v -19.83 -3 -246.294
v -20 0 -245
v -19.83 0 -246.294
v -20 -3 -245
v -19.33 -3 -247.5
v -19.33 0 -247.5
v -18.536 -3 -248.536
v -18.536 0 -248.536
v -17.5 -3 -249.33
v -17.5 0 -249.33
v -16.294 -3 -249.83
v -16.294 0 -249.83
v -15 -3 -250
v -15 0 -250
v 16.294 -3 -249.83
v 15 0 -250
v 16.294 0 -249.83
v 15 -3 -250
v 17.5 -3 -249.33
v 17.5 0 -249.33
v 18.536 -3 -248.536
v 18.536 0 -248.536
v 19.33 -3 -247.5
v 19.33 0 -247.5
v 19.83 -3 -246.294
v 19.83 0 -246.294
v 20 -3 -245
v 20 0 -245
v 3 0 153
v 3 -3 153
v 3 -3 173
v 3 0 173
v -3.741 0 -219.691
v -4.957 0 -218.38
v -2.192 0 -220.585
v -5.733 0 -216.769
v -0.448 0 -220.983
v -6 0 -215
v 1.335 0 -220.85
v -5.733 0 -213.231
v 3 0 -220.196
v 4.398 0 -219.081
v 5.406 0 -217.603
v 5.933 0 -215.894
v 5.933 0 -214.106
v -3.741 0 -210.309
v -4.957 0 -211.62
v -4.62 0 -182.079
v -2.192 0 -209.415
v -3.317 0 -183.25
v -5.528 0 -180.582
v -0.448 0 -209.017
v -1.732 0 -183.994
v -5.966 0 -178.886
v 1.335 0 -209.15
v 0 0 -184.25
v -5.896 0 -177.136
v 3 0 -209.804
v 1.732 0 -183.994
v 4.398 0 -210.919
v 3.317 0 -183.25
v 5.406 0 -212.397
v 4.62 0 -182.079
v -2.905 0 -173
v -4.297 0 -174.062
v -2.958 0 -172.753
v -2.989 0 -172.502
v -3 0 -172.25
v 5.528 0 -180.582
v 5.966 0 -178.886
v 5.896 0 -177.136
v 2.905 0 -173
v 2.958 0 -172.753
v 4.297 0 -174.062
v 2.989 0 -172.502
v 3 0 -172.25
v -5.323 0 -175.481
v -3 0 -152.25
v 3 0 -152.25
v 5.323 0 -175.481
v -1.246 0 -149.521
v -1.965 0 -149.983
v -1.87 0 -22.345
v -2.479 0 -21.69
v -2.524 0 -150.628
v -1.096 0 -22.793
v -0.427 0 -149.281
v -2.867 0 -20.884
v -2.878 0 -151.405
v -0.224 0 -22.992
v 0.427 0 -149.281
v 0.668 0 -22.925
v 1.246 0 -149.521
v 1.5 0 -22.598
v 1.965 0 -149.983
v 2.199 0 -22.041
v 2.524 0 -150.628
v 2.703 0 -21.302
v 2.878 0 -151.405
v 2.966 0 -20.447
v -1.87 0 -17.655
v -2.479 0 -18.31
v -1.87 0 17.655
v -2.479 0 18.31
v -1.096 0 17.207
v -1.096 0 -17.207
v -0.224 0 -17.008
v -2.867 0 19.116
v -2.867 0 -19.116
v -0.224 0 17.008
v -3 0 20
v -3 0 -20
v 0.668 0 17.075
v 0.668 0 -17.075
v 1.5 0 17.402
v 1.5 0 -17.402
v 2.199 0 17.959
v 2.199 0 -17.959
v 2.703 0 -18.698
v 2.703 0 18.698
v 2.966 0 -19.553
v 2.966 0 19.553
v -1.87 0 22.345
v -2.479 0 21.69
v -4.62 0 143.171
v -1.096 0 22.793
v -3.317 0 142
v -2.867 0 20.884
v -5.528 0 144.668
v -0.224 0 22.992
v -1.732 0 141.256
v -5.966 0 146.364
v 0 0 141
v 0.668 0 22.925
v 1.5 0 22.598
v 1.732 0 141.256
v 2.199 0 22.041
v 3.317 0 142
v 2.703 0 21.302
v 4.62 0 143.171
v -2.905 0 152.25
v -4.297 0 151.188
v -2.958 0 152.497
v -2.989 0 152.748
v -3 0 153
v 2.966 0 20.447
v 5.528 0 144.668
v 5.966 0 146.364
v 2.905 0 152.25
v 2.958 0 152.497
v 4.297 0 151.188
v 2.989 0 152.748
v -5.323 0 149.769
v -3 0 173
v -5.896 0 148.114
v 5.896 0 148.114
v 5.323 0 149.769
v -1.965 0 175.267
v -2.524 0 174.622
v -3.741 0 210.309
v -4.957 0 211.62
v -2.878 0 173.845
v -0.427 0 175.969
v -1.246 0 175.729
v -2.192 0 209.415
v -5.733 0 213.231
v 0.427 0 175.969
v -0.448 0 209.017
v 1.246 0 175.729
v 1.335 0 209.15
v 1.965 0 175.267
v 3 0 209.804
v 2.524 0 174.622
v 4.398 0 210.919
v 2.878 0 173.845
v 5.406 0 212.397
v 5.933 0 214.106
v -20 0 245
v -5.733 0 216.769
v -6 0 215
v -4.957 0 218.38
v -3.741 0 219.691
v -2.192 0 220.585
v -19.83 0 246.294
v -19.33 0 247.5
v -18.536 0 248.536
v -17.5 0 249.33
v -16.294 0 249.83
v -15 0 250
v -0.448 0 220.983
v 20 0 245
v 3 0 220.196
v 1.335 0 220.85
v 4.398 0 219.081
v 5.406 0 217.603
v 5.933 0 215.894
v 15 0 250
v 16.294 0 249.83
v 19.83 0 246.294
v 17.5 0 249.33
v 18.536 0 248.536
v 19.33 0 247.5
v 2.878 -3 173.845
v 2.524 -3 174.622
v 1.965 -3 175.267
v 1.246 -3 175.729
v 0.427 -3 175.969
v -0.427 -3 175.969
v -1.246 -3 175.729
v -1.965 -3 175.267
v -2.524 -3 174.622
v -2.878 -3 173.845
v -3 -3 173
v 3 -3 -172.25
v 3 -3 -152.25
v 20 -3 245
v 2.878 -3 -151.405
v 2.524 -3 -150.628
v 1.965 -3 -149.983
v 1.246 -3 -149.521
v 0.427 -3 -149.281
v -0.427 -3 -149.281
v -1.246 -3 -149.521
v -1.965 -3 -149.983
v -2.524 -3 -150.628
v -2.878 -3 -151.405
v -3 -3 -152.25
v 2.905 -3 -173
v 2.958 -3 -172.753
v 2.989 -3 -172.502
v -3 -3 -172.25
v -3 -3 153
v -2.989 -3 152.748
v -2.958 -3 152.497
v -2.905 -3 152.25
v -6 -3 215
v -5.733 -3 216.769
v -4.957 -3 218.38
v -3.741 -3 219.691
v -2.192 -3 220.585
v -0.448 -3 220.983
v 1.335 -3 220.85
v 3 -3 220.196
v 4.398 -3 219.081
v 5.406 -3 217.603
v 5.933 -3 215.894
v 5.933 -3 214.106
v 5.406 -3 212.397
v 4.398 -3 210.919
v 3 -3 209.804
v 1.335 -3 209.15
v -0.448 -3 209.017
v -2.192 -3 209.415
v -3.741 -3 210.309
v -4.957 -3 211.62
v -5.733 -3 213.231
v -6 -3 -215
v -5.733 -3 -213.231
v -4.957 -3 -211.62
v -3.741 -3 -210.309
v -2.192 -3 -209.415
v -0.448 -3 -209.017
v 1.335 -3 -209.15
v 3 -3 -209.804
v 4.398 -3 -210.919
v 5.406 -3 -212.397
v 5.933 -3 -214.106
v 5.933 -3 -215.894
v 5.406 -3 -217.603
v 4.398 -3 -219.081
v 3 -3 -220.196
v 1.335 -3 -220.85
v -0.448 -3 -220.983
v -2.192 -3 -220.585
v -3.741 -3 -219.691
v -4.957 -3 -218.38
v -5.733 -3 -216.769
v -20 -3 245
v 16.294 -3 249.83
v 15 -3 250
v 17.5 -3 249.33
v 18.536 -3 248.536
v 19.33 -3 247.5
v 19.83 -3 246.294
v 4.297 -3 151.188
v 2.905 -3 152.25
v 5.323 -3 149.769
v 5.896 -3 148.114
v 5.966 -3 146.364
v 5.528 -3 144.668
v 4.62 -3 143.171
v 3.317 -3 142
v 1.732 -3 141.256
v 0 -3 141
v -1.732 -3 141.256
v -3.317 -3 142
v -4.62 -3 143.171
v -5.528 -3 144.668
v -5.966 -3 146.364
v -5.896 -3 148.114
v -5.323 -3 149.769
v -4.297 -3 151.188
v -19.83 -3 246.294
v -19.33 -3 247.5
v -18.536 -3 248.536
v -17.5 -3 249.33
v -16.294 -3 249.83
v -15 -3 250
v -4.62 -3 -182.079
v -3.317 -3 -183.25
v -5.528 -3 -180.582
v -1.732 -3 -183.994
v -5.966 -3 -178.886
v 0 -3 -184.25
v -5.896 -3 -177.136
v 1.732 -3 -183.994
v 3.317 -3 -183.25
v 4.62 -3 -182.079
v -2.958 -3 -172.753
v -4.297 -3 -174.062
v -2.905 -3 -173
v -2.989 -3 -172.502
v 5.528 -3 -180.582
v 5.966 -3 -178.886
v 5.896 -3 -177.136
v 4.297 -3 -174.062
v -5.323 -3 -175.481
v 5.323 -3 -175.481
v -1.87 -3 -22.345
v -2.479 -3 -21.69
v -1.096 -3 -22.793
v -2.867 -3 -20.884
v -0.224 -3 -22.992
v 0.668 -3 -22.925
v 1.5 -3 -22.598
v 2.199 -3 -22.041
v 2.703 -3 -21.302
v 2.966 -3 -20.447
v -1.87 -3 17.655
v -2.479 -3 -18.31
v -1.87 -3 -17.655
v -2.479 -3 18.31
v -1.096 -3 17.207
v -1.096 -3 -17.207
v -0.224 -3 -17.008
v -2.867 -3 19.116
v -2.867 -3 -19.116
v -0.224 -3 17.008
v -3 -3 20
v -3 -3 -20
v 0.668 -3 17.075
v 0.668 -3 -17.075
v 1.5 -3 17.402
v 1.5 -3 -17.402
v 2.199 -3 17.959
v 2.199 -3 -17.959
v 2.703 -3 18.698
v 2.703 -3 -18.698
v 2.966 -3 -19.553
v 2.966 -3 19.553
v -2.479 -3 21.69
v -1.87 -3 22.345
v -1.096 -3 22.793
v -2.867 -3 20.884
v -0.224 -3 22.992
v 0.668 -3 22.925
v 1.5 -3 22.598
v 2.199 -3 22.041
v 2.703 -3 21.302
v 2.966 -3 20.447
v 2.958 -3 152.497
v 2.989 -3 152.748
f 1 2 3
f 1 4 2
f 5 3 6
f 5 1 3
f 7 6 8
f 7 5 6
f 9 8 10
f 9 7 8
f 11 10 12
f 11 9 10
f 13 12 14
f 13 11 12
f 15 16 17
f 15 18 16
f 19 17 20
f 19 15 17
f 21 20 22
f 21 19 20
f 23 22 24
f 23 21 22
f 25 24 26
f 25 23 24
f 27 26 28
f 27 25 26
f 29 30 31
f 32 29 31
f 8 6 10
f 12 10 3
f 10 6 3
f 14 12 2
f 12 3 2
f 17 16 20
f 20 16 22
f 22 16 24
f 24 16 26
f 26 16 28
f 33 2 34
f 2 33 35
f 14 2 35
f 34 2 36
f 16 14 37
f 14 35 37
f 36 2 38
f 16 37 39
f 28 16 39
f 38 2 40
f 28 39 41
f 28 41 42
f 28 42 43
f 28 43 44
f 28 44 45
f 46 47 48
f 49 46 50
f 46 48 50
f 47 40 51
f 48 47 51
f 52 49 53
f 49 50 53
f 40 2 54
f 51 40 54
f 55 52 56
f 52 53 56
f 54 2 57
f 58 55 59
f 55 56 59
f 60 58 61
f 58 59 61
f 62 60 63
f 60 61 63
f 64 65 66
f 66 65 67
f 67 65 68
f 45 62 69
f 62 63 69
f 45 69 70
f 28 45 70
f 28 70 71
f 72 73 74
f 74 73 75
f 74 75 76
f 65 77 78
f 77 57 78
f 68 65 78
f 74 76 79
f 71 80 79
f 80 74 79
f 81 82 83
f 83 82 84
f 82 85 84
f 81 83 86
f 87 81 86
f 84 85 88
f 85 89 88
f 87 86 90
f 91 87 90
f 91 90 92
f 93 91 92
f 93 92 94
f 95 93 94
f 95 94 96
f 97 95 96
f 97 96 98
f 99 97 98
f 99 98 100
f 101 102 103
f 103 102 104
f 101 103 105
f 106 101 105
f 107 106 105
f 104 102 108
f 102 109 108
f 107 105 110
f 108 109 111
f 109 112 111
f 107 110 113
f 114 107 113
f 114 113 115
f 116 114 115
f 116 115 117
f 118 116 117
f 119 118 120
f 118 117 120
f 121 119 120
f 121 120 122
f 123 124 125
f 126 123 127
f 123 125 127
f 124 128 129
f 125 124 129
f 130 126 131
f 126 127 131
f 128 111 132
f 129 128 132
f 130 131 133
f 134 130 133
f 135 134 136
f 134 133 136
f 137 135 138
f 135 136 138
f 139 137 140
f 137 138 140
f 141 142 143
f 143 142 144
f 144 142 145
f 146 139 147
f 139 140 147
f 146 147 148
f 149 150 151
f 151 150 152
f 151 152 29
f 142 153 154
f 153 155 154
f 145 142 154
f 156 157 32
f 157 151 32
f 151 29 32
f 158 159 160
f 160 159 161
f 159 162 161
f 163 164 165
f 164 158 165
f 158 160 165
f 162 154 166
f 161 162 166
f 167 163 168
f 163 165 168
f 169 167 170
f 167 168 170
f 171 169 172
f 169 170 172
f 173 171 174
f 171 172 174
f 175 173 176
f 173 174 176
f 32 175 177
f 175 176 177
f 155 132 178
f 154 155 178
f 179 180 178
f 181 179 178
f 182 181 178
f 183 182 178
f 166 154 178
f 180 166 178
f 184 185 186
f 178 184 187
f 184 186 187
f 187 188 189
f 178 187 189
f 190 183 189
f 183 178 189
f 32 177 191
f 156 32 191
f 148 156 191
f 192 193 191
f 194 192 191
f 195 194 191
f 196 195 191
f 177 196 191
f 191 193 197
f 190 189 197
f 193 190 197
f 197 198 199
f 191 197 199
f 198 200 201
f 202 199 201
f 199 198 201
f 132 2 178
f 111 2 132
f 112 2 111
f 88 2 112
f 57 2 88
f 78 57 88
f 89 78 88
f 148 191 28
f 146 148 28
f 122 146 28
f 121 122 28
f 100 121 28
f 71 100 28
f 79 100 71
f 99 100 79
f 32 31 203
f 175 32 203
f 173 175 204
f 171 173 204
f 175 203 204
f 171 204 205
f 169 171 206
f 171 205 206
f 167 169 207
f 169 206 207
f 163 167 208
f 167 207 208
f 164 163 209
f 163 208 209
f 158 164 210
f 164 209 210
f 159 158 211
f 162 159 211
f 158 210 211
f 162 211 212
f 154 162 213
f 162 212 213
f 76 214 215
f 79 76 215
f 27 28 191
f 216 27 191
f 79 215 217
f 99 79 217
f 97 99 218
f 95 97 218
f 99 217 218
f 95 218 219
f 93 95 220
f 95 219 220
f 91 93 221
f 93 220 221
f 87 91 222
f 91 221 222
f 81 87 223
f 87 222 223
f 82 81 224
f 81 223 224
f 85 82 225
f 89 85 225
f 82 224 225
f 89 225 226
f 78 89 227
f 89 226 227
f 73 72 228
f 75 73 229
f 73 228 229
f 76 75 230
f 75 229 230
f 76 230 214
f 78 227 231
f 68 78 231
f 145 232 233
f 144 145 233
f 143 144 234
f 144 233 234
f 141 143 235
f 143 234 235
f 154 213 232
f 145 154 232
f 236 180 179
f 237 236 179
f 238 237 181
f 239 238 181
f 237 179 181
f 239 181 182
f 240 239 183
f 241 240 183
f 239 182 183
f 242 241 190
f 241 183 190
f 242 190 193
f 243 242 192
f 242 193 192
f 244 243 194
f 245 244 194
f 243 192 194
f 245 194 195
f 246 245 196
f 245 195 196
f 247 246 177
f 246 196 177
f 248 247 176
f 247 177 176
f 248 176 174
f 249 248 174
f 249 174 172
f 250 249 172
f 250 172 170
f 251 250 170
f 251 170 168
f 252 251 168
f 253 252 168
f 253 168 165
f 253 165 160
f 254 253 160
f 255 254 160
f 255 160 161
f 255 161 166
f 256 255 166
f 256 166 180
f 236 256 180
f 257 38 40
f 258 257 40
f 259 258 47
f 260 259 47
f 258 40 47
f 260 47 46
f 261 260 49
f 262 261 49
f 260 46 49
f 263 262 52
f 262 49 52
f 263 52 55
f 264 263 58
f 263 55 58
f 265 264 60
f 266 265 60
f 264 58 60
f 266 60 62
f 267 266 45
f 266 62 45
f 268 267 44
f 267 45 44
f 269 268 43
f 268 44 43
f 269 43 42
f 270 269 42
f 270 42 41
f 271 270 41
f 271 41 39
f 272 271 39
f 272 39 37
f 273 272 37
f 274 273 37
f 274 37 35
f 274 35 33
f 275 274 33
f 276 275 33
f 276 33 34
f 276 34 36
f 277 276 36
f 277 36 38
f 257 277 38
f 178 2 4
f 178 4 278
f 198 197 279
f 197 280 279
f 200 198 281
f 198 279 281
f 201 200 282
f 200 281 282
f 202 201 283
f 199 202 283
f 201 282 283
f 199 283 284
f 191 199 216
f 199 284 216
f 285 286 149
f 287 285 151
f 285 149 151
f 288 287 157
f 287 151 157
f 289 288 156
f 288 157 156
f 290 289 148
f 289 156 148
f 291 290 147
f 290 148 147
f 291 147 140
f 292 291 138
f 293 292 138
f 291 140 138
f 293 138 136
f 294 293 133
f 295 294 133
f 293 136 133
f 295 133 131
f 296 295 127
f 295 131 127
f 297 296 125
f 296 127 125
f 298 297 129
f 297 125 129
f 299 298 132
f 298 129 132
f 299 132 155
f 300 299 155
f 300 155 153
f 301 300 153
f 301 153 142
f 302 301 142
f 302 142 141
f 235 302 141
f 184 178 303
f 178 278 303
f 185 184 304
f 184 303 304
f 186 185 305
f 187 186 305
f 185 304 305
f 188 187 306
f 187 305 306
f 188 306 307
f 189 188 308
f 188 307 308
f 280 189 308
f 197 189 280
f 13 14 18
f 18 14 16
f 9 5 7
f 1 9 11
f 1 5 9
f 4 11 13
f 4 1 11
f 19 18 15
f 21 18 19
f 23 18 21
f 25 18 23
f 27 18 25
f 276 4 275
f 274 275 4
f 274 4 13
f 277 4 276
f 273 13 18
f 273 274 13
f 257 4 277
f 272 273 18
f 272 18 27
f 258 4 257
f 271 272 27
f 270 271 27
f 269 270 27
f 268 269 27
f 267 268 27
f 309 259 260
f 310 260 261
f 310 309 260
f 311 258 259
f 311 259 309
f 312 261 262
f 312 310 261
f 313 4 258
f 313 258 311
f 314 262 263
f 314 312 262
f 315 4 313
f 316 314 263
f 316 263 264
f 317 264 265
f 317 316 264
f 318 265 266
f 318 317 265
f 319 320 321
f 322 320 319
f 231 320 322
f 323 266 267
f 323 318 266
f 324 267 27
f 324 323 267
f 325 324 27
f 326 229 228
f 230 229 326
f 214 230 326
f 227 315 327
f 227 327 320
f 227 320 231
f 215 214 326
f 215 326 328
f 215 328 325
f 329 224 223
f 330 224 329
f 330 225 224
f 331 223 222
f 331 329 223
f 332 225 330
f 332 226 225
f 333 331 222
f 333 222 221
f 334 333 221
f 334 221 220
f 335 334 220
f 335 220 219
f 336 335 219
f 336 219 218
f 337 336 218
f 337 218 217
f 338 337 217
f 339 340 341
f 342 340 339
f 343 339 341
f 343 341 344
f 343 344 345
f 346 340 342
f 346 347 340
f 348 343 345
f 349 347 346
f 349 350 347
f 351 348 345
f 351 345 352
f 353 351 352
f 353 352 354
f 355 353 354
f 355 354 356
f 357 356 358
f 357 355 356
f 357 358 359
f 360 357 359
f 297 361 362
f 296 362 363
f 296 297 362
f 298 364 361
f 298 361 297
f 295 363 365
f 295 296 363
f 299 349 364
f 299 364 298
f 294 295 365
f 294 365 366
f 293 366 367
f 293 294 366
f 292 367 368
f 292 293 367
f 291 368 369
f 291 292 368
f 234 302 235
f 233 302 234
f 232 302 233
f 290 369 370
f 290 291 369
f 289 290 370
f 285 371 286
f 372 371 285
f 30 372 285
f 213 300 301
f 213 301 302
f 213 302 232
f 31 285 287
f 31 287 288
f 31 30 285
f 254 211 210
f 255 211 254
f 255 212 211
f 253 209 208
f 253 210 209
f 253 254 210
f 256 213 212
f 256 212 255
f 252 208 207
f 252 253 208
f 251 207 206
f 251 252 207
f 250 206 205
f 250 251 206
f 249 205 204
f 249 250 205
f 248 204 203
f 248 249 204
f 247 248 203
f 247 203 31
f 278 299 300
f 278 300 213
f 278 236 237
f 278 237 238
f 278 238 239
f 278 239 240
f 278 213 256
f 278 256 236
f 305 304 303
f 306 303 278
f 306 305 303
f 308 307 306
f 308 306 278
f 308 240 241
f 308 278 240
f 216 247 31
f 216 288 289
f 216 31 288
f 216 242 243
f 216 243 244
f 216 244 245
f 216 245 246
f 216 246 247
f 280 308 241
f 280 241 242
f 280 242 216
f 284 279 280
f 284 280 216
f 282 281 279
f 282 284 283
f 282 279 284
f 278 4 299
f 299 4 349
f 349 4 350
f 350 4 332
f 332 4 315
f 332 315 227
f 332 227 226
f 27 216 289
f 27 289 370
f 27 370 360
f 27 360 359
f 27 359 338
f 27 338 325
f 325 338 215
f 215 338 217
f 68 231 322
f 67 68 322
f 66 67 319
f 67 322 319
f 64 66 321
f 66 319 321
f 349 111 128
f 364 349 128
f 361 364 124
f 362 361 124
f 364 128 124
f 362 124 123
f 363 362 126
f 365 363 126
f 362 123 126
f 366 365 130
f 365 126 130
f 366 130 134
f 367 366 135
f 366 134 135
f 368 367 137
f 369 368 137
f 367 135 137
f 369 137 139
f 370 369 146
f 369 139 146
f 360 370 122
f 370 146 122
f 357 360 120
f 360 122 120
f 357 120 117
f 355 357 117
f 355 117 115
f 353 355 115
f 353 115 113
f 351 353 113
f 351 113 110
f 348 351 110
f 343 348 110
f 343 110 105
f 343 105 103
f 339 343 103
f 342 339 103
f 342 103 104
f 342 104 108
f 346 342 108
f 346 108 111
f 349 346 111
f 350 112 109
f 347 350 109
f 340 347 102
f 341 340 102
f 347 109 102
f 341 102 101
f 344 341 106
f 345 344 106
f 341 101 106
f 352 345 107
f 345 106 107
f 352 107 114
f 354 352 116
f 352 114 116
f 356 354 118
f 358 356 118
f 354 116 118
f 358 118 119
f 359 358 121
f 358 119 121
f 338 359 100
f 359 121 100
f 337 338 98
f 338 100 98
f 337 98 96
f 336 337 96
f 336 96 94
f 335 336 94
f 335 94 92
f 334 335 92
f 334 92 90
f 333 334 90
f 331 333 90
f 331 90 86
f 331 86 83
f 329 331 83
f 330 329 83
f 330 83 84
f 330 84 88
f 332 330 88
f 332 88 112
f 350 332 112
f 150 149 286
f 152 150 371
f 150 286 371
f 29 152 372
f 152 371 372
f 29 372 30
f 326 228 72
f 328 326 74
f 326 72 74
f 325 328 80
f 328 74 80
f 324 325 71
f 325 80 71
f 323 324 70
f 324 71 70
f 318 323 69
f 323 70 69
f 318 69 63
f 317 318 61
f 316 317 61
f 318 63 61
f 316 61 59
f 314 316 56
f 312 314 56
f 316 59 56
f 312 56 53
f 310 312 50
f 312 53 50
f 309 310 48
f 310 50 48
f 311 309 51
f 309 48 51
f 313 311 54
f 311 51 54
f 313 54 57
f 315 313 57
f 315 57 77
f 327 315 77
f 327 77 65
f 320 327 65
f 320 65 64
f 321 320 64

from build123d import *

# Parameters (mm, degrees)
F0_W      = 40
F0_H      = 500
F1_DEPTH  = 3
F3_D      = 12
F5_D      = 12
F7_DEPTH  = 6
F8_D      = 12
F10_DEPTH = 6
F12_D     = 6
F13_R     = 5


with BuildPart() as f1:
    # F0 (on Front) → F1 (new body)
    with BuildSketch(Plane.XZ):
        Rectangle(F0_W, F0_H)
    extrude(amount=F1_DEPTH)

    # F3 (through all)
    with Locations(Plane.XZ.offset(3)):
        with Locations((0, -215), (0, 215)):
            Hole(F3_D / 2)

    # F5 (through all)
    with Locations(Plane.XZ.offset(3)):
        with Locations((0, 147)):
            Hole(F5_D / 2)

    # F6 (on face) → F7 (cut)
    with BuildSketch(Plane.XZ.offset(3)):
        with BuildLine():
            ThreePointArc((-3, 153), (0, 150), (3, 153))
            Line((3, 153), (3, 173))
            ThreePointArc((3, 173), (0, 176), (-3, 173))
            Line((-3, 173), (-3, 153))
        make_face()
    extrude(amount=-F7_DEPTH, mode=Mode.SUBTRACT)

    # F8 (through all)
    with Locations(Plane.XZ.offset(3)):
        with Locations((0, -178.25)):
            Hole(F8_D / 2)

    # F9 (on face) → F10 (cut)
    with BuildSketch(Plane.XZ.offset(3)):
        with BuildLine():
            ThreePointArc((-3, -172.25), (0, -175.25), (3, -172.25))
            Line((3, -172.25), (3, -152.25))
            ThreePointArc((3, -152.25), (0, -149.25), (-3, -152.25))
            Line((-3, -152.25), (-3, -172.25))
        make_face()
    extrude(amount=-F10_DEPTH, mode=Mode.SUBTRACT)

    # F12 (through all)
    with Locations(Plane.XZ.offset(3)):
        with Locations((0, 20), (0, -20)):
            Hole(F12_D / 2)

    # F13
    f13_edges = [f1.edges().sort_by_distance(p)[0] for p in [
        (-20, -1.5, -250),
        (20, -1.5, -250),
        (20, -1.5, 250),
        (-20, -1.5, 250),
    ]]
    fillet(f13_edges, radius=F13_R)


solid = f1.part
